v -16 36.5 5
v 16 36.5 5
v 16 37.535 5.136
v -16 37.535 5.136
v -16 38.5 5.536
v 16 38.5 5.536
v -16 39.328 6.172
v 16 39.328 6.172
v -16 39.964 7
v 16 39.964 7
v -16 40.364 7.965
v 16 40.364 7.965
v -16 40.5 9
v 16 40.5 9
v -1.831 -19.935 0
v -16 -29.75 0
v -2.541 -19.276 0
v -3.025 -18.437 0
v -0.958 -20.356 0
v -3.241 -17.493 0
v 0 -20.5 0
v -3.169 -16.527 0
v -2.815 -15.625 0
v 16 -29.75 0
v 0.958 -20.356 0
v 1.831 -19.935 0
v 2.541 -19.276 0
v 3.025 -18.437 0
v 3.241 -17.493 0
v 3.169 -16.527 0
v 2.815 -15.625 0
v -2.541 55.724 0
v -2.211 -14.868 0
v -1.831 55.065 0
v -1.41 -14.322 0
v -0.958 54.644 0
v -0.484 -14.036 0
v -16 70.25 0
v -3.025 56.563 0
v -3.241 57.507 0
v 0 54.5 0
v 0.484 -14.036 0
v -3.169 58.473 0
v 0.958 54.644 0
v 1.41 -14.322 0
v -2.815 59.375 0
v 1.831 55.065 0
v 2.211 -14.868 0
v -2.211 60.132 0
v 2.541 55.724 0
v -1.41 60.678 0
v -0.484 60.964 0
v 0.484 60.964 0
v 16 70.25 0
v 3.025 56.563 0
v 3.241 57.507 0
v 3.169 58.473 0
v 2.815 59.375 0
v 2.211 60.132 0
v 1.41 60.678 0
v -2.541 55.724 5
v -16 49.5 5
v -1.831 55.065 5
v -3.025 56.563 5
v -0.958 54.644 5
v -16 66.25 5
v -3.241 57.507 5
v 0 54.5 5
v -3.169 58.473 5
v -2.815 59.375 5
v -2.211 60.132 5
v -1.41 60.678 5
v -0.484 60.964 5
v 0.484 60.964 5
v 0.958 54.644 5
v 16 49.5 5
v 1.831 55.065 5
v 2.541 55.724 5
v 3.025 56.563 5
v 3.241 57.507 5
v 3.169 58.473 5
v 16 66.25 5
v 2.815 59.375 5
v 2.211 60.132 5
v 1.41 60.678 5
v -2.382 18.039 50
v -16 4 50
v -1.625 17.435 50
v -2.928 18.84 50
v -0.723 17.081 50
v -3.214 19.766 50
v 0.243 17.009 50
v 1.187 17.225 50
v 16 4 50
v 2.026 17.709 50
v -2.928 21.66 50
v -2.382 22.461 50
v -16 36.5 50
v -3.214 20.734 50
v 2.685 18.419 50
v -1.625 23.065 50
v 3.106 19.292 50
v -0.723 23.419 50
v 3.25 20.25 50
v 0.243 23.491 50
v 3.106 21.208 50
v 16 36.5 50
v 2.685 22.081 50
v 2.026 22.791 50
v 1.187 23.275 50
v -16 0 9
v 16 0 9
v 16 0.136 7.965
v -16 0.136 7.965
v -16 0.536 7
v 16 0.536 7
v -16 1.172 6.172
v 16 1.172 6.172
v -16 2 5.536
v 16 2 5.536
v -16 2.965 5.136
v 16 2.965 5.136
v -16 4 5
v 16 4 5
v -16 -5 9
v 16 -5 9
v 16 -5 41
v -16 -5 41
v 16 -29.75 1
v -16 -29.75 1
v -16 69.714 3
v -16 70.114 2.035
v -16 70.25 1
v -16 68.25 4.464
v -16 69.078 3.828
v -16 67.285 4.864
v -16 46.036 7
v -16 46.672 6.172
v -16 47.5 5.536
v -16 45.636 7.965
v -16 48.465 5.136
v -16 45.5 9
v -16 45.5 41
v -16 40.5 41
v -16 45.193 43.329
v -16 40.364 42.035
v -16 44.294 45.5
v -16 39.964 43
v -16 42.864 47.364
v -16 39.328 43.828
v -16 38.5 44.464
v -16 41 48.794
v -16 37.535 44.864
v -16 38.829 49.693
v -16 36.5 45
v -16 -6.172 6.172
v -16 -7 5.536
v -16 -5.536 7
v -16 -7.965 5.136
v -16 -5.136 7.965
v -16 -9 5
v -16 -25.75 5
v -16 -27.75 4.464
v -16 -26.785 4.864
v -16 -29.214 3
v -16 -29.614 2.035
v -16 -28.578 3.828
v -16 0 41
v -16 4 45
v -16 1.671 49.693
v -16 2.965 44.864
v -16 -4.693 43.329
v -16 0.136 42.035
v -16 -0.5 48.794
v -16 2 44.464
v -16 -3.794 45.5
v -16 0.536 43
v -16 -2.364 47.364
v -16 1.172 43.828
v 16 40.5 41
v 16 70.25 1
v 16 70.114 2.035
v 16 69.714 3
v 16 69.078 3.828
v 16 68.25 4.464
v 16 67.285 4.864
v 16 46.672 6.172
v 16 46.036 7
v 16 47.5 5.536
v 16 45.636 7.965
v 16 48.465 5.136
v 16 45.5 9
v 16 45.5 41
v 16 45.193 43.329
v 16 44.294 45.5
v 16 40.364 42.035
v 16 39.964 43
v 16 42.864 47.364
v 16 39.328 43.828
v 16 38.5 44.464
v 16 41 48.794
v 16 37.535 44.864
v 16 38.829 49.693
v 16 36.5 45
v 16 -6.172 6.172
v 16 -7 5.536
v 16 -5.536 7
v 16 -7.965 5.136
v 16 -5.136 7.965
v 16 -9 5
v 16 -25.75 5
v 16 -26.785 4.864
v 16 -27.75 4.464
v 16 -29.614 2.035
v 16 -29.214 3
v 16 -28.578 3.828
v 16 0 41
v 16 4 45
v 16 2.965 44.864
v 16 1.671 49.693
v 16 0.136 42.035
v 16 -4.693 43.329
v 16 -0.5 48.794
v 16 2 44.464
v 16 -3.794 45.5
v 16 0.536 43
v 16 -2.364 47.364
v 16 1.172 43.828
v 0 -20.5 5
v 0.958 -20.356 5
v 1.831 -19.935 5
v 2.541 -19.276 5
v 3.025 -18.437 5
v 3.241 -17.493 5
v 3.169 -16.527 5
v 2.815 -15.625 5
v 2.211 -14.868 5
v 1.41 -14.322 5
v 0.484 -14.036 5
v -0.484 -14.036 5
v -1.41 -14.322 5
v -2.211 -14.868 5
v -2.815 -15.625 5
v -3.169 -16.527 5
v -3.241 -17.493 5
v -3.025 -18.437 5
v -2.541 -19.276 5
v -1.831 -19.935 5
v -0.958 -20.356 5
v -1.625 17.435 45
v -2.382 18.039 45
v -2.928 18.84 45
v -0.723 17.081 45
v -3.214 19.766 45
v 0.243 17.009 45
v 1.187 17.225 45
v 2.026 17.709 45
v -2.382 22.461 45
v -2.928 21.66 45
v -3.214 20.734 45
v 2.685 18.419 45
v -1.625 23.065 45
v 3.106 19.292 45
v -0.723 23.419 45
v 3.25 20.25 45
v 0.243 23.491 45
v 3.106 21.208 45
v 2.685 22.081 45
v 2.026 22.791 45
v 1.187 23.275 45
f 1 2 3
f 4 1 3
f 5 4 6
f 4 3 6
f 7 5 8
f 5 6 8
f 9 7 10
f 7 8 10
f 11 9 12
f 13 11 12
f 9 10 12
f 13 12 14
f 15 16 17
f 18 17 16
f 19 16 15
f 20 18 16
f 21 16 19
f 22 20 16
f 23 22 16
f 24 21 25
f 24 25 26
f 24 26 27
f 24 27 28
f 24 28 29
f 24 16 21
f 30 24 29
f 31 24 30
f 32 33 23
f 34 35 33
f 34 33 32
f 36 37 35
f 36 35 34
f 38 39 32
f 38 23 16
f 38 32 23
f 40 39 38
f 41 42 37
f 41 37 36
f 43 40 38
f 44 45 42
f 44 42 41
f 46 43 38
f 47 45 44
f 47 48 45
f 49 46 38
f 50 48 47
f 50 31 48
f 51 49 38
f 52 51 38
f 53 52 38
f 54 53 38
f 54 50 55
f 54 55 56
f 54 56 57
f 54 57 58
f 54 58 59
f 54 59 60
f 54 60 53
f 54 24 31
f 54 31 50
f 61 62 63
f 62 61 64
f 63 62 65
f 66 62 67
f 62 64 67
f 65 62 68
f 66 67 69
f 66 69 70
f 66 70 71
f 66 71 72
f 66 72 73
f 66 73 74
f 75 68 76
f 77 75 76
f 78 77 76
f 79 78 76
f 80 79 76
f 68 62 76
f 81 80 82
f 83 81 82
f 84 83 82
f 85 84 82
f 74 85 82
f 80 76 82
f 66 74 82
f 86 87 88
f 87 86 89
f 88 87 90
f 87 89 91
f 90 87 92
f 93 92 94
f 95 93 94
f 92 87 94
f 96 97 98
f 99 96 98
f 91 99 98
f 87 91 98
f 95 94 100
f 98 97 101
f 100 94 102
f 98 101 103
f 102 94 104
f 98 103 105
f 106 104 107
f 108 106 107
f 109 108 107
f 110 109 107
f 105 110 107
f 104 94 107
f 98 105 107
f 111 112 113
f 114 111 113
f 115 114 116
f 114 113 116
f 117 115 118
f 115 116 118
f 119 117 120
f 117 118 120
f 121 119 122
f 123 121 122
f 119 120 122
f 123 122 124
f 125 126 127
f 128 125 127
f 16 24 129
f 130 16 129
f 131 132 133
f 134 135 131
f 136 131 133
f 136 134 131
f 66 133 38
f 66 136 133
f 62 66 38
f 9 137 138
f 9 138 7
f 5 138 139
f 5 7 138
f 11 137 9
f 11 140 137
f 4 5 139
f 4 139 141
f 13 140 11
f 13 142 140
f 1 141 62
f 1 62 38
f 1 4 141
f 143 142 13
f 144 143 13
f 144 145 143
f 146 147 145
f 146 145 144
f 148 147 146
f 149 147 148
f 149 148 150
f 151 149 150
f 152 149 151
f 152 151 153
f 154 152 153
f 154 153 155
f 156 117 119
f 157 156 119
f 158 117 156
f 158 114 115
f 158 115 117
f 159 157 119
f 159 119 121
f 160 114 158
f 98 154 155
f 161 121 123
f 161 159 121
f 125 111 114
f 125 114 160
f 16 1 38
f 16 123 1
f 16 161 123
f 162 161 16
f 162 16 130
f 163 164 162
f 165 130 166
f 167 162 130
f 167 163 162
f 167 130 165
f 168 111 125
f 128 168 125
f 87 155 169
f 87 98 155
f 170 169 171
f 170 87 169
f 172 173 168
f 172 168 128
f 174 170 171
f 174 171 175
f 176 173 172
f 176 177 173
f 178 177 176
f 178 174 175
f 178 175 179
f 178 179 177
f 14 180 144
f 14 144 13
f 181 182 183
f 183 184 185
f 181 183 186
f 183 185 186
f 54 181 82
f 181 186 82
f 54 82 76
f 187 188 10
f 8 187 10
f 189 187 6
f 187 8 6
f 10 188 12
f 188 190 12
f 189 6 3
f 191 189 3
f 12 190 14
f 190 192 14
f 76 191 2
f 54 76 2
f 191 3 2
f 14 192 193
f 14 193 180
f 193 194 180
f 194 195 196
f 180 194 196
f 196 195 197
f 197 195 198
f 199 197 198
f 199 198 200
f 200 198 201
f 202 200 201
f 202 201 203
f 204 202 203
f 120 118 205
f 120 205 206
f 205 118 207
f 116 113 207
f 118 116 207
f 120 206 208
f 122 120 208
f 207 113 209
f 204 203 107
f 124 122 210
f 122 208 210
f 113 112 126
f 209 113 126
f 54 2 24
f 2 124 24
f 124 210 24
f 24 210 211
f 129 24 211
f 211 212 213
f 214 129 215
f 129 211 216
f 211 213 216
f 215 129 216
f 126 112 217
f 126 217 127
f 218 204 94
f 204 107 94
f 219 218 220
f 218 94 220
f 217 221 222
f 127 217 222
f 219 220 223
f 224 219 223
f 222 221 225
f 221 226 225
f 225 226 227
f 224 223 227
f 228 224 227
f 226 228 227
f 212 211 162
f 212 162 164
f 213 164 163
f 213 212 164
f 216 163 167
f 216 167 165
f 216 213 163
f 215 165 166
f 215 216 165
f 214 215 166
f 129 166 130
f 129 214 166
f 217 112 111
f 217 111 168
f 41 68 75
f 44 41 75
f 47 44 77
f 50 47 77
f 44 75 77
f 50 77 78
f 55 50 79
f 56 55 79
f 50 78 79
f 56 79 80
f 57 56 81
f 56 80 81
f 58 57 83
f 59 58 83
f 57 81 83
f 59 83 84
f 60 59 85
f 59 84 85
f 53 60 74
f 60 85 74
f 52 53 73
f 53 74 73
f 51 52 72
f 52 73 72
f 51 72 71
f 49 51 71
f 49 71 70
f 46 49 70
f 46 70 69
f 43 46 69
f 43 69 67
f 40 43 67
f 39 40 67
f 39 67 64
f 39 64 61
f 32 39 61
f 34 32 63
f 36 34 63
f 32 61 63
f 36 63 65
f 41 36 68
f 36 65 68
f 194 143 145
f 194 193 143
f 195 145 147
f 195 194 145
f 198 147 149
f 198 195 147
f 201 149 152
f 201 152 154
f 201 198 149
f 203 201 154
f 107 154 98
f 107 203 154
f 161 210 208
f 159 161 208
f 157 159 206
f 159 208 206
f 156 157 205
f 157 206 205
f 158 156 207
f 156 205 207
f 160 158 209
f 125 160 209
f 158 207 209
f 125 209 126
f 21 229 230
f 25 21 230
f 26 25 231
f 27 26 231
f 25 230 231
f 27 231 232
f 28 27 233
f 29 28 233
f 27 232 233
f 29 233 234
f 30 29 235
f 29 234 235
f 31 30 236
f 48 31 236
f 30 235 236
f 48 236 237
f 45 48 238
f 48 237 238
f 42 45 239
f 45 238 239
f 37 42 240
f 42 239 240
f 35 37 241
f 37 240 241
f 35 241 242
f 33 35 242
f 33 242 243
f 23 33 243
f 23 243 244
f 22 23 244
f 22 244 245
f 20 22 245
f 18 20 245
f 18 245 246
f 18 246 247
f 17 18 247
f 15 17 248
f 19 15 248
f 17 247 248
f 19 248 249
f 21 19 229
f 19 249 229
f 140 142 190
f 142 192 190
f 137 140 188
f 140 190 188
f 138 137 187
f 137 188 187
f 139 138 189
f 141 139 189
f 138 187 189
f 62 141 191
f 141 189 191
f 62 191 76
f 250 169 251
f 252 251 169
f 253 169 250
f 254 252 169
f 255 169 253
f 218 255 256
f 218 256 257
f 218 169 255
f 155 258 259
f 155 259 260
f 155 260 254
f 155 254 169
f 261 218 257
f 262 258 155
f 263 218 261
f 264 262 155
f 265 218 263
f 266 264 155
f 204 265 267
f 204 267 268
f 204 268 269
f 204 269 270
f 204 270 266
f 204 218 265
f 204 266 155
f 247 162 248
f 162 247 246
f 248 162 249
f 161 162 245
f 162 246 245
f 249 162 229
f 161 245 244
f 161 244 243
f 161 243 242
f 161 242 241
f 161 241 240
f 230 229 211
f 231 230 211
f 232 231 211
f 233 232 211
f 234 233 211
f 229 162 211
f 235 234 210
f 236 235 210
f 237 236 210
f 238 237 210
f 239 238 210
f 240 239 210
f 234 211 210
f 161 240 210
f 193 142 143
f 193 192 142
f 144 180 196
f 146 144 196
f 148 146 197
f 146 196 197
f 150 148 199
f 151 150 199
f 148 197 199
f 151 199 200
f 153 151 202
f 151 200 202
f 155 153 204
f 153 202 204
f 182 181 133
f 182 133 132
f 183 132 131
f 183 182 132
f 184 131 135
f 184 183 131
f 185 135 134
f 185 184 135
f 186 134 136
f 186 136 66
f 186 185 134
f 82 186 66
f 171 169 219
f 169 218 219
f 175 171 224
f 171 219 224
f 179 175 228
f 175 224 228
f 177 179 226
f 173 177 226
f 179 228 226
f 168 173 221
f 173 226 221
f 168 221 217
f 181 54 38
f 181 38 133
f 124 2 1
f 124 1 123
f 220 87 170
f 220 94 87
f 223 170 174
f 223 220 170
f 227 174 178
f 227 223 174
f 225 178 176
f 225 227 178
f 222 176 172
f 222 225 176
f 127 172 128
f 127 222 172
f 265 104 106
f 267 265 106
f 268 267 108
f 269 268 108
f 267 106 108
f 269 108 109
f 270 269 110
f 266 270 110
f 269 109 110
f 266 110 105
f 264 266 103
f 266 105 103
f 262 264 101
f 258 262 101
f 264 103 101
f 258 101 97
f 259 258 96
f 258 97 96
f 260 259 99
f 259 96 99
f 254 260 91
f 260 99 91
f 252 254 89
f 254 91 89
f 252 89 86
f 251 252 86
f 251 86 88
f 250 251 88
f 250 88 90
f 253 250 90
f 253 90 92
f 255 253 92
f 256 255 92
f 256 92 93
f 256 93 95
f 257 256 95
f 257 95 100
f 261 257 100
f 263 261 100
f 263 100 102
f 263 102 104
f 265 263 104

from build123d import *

# Parameters (mm, degrees)
PAD_DEPTH       = 16
SKETCH014_R     = 3.25
POCKET007_DEPTH = 10
SKETCH017_R     = 3.25
POCKET008_DEPTH = 5


with BuildPart() as part:
    # Sketch → Pad (new body, symmetric)
    with BuildSketch(Plane.YZ):
        with BuildLine():
            Line((-5, 9), (-5, 41))
            ThreePointArc((4, 50), (-2.363961, 47.363961), (-5, 41))
            Line((4, 50), (36.5, 50))
            ThreePointArc((45.5, 41), (42.863961, 47.363961), (36.5, 50))
            Line((45.5, 9), (45.5, 41))
            ThreePointArc((45.5, 9), (46.671573, 6.171573), (49.5, 5))
            Line((49.5, 5), (66.25, 5))
            ThreePointArc((70.25, 1), (69.078427, 3.828427), (66.25, 5))
            Line((70.25, 0), (70.25, 1))
            Line((-29.75, 0), (70.25, 0))
            Line((-29.75, 0), (-29.75, 1))
            ThreePointArc((-25.75, 5), (-28.578427, 3.828427), (-29.75, 1))
            Line((-25.75, 5), (-9, 5))
            ThreePointArc((-9, 5), (-6.171573, 6.171573), (-5, 9))
        make_face()
        with BuildLine():
            ThreePointArc((4, 45), (1.171573, 43.828427), (0, 41))
            Line((0, 9), (0, 41))
            ThreePointArc((0, 9), (1.171573, 6.171573), (4, 5))
            Line((36.5, 5), (4, 5))
            ThreePointArc((36.5, 5), (39.328427, 6.171573), (40.5, 9))
            Line((40.5, 41), (40.5, 9))
            ThreePointArc((40.5, 41), (39.328427, 43.828427), (36.5, 45))
            Line((4, 45), (36.5, 45))
        make_face(mode=Mode.SUBTRACT)
    extrude(amount=PAD_DEPTH, both=True)

    # Sketch014 → Pocket007 (cut)
    with BuildSketch(Plane.XY.offset(50)):
        with Locations((0, 20.25)):
            Circle(SKETCH014_R)
    extrude(amount=-POCKET007_DEPTH, mode=Mode.SUBTRACT)

    # Sketch017 (on Face13 of Pocket007) → Pocket008 (cut)
    with BuildSketch(Plane(origin=(0, 0, 5), x_dir=(0, -1, 0), z_dir=(0, 0, 1))):
        with Locations((-57.75, 0)):
            Circle(SKETCH017_R)
        with Locations((17.25, 0)):
            Circle(SKETCH017_R)
    extrude(amount=-POCKET008_DEPTH, mode=Mode.SUBTRACT)


solid = part.part
